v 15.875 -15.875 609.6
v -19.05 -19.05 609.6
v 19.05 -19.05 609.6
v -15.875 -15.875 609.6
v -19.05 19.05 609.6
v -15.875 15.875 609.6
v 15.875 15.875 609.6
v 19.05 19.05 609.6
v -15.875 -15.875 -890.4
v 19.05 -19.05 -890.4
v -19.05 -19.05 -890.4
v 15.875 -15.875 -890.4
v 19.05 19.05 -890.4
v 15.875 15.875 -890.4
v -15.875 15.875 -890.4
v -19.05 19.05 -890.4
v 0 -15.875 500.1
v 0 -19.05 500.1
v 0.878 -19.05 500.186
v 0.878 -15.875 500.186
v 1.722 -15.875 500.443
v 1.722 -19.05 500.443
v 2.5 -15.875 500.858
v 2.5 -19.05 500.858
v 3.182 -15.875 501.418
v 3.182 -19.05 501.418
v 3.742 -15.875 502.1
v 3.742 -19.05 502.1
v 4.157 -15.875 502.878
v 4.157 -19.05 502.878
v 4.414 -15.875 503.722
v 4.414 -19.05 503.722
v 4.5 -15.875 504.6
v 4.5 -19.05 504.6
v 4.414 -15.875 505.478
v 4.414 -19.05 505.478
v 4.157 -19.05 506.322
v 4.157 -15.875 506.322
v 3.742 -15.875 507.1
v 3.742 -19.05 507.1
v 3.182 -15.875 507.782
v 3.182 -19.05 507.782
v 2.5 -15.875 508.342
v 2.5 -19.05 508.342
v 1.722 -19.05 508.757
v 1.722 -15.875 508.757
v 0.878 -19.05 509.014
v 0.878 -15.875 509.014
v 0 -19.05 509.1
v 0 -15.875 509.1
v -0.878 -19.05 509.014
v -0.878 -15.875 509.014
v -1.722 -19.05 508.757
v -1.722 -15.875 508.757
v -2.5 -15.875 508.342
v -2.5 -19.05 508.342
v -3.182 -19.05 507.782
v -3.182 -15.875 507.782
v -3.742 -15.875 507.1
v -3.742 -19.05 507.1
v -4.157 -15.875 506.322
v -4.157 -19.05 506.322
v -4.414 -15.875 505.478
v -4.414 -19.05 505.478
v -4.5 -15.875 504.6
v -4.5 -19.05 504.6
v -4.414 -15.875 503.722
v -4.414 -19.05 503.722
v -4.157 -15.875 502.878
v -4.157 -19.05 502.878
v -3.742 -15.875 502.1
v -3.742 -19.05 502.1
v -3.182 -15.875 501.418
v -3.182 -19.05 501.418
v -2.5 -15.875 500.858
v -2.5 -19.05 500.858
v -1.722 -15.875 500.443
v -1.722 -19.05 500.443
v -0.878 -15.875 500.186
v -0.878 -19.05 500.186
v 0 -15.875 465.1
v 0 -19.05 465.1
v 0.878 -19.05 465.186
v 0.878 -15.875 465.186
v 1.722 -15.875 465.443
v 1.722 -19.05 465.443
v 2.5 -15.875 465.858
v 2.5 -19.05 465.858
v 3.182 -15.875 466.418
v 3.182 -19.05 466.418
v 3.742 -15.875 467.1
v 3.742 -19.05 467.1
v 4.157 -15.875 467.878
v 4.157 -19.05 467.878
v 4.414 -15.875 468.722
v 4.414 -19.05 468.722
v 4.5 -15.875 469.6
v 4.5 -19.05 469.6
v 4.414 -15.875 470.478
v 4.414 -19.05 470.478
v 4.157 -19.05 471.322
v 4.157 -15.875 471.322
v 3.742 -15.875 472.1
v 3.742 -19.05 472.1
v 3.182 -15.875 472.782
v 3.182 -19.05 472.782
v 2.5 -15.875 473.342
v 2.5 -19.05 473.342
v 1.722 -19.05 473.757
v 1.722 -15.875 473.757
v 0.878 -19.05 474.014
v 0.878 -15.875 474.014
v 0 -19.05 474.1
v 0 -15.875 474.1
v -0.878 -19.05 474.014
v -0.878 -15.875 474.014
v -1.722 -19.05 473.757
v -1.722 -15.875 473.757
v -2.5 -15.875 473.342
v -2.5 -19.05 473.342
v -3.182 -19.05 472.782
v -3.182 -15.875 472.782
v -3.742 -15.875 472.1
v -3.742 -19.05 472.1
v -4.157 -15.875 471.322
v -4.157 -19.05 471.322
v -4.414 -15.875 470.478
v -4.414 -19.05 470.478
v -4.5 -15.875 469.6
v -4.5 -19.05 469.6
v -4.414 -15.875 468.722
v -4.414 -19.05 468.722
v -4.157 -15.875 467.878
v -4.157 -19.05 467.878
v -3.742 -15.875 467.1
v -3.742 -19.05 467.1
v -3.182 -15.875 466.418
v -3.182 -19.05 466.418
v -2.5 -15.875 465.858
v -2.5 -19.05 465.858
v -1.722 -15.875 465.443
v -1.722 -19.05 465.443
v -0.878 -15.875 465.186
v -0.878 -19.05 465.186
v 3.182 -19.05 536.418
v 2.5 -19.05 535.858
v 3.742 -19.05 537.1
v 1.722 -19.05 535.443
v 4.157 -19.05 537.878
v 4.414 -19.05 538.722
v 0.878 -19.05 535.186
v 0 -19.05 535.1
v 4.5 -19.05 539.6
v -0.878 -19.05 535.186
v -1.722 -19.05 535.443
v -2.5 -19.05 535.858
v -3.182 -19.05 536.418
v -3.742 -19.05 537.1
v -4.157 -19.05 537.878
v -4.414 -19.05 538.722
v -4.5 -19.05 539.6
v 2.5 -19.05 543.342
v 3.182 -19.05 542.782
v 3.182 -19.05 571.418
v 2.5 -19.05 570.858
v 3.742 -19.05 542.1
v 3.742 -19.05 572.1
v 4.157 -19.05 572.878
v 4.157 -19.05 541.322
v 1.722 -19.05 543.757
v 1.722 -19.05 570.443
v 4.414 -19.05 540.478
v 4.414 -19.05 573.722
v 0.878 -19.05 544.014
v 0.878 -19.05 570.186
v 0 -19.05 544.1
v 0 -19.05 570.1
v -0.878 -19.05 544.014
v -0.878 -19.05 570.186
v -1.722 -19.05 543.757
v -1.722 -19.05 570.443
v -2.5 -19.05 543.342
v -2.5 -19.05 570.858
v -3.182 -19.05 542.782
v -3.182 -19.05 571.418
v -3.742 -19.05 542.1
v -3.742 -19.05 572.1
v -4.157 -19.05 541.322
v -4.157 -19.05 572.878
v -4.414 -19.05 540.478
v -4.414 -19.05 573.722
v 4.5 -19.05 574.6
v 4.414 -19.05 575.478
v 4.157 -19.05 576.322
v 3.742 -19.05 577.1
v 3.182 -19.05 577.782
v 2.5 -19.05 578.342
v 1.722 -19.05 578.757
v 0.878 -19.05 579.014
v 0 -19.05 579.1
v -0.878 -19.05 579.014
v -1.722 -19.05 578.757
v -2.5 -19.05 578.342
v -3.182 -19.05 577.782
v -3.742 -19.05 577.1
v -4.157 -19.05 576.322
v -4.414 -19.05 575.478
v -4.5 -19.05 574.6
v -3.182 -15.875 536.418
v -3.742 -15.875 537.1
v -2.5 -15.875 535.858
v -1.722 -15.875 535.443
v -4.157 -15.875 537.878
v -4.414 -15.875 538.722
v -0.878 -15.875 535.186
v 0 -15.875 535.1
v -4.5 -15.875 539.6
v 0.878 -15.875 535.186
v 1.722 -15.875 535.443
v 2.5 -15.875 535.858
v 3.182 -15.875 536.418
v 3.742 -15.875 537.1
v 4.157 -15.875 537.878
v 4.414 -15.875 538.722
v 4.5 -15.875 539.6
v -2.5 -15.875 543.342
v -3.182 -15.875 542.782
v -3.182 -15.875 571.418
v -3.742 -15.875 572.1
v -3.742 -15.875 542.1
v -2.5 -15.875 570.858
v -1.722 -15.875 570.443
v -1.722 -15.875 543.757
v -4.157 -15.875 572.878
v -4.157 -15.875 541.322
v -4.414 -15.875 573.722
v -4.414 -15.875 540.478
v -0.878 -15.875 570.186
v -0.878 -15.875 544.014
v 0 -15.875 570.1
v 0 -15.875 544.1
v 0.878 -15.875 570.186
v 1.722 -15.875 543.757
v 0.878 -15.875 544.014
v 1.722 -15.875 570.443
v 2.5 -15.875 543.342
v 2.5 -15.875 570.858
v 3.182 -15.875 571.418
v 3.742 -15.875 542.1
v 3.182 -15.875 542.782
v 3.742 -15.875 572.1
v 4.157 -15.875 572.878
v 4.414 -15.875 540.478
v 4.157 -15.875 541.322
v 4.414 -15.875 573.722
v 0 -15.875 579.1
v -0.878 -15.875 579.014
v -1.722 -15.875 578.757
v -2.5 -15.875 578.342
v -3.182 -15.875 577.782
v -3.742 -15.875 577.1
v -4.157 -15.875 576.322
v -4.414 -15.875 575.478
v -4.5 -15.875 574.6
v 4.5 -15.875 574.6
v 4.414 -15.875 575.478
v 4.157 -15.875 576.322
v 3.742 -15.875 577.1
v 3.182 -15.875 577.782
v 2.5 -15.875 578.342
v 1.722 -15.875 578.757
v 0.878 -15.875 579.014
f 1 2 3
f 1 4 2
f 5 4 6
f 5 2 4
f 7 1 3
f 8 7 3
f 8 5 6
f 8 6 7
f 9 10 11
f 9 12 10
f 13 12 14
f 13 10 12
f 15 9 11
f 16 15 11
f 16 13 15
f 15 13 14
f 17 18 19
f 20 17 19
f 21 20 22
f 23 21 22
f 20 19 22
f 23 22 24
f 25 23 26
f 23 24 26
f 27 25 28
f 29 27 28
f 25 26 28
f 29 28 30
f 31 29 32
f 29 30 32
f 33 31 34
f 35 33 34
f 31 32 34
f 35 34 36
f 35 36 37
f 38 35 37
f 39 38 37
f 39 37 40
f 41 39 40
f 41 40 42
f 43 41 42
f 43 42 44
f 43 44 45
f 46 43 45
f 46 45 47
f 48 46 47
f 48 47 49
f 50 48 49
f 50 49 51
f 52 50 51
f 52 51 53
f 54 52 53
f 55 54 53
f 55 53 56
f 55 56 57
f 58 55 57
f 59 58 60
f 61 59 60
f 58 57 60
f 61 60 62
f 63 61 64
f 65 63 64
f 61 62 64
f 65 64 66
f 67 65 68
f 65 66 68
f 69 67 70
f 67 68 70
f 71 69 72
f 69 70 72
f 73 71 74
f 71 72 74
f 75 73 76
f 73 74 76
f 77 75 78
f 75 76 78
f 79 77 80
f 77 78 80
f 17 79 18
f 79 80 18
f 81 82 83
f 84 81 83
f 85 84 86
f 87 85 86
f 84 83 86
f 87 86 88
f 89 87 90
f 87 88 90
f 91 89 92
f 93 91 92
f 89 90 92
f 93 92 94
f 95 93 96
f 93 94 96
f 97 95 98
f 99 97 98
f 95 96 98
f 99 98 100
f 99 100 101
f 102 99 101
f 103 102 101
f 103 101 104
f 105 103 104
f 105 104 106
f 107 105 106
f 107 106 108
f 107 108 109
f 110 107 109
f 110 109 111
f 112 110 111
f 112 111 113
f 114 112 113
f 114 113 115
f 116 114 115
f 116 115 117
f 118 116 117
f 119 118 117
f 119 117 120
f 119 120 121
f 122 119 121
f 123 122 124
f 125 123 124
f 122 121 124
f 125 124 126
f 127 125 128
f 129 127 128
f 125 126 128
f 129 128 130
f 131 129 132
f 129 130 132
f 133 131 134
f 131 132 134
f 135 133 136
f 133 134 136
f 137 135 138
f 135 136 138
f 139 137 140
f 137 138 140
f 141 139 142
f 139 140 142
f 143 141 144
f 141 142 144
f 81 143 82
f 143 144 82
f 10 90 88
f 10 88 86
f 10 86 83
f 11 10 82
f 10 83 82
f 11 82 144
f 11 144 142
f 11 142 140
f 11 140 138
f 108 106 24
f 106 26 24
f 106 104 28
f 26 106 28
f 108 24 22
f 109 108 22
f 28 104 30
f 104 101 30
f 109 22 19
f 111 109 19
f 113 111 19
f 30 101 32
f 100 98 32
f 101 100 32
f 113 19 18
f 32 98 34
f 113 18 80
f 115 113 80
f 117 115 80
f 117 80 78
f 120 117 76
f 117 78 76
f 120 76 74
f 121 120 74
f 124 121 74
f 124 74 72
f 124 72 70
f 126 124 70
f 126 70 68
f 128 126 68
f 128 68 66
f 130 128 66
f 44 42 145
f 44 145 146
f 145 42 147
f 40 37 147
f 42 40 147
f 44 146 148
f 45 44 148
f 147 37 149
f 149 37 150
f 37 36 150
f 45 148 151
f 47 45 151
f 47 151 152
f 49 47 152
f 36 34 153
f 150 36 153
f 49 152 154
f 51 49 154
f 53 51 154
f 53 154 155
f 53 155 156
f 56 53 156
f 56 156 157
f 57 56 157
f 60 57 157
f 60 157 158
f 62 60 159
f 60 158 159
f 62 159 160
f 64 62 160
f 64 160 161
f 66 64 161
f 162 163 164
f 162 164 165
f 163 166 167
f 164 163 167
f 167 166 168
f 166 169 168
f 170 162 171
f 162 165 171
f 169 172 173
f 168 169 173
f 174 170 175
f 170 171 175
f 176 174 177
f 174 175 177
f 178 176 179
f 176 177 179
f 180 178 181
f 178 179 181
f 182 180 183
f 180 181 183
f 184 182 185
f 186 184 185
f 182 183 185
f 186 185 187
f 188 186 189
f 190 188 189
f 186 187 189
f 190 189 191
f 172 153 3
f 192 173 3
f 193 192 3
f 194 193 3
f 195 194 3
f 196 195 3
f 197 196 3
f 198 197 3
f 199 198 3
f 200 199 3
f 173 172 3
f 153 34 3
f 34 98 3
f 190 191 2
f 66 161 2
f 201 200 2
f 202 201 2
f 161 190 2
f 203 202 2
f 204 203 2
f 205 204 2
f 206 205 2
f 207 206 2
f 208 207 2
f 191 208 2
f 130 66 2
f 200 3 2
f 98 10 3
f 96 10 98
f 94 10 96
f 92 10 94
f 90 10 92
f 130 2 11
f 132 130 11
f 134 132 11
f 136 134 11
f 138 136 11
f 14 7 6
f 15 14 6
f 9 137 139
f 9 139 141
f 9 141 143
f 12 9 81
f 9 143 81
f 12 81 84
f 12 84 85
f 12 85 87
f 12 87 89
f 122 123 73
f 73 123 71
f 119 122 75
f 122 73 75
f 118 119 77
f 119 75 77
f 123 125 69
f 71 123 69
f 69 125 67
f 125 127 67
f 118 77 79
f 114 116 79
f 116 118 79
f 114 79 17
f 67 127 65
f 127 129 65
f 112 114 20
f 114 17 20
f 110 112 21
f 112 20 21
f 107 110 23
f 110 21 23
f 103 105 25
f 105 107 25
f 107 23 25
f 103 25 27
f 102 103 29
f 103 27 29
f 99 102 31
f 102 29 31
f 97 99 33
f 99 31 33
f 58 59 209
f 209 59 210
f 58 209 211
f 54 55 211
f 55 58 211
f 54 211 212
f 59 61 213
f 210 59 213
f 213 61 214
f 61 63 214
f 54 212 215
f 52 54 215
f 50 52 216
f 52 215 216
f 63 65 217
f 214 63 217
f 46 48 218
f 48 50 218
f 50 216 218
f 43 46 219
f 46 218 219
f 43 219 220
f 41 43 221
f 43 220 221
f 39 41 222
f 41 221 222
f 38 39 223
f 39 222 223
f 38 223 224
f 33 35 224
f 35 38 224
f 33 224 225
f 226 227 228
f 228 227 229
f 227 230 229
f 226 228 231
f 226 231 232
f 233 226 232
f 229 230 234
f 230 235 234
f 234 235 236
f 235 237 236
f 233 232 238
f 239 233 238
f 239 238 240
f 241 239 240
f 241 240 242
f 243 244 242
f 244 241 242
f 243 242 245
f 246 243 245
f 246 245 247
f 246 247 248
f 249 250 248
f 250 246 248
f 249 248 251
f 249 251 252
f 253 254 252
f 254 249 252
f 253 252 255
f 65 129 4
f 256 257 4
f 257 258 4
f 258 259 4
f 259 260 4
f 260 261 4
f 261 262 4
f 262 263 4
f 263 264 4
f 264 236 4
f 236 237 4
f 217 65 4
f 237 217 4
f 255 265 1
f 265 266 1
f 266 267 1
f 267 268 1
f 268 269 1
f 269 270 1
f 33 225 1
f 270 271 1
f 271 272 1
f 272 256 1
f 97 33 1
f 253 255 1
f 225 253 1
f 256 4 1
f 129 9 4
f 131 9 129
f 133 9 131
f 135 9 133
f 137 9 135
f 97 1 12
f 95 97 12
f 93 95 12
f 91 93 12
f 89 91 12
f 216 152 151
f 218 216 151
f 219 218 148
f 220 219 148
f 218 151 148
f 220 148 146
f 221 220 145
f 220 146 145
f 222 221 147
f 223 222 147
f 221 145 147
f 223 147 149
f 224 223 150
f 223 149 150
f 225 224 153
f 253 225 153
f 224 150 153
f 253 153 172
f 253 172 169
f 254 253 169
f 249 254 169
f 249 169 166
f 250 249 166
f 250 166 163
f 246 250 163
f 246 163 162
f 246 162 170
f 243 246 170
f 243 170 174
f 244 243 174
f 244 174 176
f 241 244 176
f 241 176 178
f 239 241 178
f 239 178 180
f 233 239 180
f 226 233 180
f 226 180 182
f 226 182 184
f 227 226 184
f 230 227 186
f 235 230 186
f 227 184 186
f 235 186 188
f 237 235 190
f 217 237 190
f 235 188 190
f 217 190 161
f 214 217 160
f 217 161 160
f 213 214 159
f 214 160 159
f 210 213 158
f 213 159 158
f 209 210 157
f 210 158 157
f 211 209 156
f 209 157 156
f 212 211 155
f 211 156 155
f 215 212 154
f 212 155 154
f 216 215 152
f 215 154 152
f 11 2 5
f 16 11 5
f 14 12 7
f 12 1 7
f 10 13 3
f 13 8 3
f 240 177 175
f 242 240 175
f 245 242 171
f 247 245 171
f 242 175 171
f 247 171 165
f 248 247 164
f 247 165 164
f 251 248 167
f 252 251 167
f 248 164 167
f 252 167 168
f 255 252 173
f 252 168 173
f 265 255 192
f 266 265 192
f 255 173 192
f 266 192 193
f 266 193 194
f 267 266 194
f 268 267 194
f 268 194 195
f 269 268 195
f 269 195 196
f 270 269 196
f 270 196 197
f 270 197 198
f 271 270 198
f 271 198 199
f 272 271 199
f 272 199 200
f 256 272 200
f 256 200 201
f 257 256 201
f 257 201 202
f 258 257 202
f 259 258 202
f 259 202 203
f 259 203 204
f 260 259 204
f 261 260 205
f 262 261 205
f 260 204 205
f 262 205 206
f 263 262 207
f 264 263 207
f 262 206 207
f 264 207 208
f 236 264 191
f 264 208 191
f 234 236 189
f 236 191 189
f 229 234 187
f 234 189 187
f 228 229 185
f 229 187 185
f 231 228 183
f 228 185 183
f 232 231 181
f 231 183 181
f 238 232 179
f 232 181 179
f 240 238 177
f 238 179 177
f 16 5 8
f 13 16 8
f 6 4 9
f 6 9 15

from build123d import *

# Parameters (mm, degrees)
BOSS_EXTRUDE1_DEPTH = 609.6
SKETCH3_R           = 4.5
CUT_EXTRUDE1_DEPTH  = 10
SKETCH6_W           = 34.925
SKETCH6_H           = 3.175
BOSS_EXTRUDE2_DEPTH = 890.4
SKETCH7_W           = 3.175
SKETCH7_H           = 38.1
BOSS_EXTRUDE3_DEPTH = 1500


with BuildPart() as part:
    # Sketch2 → Boss-Extrude1 (new body)
    with BuildSketch(Plane.XY):
        Polygon((-15.875, -15.875), (-19.05, -15.875), (-19.05, -19.05), (19.05, -19.05), (19.05, 19.05), (-19.05, 19.05), (-19.05, 15.875), (-15.875, 15.875), (15.875, 15.875), (15.875, -15.875), align=None)
    extrude(amount=BOSS_EXTRUDE1_DEPTH)

    # Sketch3 → Cut-Extrude1 (cut)
    with BuildSketch(Plane.XZ.offset(19.05)):
        with Locations(Location((0, 574.6, 0), (0, 0, 270))):
            Circle(SKETCH3_R)
        with Locations(Location((0, 539.6, 0), (0, 0, 270))):
            Circle(SKETCH3_R)
        with Locations(Location((0, 469.6, 0), (0, 0, 270))):
            Circle(SKETCH3_R)
        with Locations(Location((0, 504.6, 0), (0, 0, 270))):
            Circle(SKETCH3_R)
    extrude(amount=-CUT_EXTRUDE1_DEPTH, mode=Mode.SUBTRACT)

    # Sketch6 → Boss-Extrude2 (add)
    with BuildSketch(Plane(origin=(0, 0, 0), x_dir=(-1, 0, 0), z_dir=(0, 0, -1))):
        Polygon((19.05, -15.875), (-15.875, -15.875), (-19.05, -15.875), (-19.05, -19.05), (19.05, -19.05), align=None)
        Polygon((-15.875, 15.875), (-15.875, 19.05), (-19.05, 19.05), (-19.05, -15.875), (-15.875, -15.875), align=None)
        with Locations((1.5875, 17.4625)):
            Rectangle(SKETCH6_W, SKETCH6_H)
    extrude(amount=BOSS_EXTRUDE2_DEPTH)

    # Sketch7 → Boss-Extrude3 (add)
    with BuildSketch(Plane.XY.offset(609.6)):
        with Locations((-17.4625, 0)):
            Rectangle(SKETCH7_W, SKETCH7_H)
    extrude(amount=-BOSS_EXTRUDE3_DEPTH)


solid = part.part
